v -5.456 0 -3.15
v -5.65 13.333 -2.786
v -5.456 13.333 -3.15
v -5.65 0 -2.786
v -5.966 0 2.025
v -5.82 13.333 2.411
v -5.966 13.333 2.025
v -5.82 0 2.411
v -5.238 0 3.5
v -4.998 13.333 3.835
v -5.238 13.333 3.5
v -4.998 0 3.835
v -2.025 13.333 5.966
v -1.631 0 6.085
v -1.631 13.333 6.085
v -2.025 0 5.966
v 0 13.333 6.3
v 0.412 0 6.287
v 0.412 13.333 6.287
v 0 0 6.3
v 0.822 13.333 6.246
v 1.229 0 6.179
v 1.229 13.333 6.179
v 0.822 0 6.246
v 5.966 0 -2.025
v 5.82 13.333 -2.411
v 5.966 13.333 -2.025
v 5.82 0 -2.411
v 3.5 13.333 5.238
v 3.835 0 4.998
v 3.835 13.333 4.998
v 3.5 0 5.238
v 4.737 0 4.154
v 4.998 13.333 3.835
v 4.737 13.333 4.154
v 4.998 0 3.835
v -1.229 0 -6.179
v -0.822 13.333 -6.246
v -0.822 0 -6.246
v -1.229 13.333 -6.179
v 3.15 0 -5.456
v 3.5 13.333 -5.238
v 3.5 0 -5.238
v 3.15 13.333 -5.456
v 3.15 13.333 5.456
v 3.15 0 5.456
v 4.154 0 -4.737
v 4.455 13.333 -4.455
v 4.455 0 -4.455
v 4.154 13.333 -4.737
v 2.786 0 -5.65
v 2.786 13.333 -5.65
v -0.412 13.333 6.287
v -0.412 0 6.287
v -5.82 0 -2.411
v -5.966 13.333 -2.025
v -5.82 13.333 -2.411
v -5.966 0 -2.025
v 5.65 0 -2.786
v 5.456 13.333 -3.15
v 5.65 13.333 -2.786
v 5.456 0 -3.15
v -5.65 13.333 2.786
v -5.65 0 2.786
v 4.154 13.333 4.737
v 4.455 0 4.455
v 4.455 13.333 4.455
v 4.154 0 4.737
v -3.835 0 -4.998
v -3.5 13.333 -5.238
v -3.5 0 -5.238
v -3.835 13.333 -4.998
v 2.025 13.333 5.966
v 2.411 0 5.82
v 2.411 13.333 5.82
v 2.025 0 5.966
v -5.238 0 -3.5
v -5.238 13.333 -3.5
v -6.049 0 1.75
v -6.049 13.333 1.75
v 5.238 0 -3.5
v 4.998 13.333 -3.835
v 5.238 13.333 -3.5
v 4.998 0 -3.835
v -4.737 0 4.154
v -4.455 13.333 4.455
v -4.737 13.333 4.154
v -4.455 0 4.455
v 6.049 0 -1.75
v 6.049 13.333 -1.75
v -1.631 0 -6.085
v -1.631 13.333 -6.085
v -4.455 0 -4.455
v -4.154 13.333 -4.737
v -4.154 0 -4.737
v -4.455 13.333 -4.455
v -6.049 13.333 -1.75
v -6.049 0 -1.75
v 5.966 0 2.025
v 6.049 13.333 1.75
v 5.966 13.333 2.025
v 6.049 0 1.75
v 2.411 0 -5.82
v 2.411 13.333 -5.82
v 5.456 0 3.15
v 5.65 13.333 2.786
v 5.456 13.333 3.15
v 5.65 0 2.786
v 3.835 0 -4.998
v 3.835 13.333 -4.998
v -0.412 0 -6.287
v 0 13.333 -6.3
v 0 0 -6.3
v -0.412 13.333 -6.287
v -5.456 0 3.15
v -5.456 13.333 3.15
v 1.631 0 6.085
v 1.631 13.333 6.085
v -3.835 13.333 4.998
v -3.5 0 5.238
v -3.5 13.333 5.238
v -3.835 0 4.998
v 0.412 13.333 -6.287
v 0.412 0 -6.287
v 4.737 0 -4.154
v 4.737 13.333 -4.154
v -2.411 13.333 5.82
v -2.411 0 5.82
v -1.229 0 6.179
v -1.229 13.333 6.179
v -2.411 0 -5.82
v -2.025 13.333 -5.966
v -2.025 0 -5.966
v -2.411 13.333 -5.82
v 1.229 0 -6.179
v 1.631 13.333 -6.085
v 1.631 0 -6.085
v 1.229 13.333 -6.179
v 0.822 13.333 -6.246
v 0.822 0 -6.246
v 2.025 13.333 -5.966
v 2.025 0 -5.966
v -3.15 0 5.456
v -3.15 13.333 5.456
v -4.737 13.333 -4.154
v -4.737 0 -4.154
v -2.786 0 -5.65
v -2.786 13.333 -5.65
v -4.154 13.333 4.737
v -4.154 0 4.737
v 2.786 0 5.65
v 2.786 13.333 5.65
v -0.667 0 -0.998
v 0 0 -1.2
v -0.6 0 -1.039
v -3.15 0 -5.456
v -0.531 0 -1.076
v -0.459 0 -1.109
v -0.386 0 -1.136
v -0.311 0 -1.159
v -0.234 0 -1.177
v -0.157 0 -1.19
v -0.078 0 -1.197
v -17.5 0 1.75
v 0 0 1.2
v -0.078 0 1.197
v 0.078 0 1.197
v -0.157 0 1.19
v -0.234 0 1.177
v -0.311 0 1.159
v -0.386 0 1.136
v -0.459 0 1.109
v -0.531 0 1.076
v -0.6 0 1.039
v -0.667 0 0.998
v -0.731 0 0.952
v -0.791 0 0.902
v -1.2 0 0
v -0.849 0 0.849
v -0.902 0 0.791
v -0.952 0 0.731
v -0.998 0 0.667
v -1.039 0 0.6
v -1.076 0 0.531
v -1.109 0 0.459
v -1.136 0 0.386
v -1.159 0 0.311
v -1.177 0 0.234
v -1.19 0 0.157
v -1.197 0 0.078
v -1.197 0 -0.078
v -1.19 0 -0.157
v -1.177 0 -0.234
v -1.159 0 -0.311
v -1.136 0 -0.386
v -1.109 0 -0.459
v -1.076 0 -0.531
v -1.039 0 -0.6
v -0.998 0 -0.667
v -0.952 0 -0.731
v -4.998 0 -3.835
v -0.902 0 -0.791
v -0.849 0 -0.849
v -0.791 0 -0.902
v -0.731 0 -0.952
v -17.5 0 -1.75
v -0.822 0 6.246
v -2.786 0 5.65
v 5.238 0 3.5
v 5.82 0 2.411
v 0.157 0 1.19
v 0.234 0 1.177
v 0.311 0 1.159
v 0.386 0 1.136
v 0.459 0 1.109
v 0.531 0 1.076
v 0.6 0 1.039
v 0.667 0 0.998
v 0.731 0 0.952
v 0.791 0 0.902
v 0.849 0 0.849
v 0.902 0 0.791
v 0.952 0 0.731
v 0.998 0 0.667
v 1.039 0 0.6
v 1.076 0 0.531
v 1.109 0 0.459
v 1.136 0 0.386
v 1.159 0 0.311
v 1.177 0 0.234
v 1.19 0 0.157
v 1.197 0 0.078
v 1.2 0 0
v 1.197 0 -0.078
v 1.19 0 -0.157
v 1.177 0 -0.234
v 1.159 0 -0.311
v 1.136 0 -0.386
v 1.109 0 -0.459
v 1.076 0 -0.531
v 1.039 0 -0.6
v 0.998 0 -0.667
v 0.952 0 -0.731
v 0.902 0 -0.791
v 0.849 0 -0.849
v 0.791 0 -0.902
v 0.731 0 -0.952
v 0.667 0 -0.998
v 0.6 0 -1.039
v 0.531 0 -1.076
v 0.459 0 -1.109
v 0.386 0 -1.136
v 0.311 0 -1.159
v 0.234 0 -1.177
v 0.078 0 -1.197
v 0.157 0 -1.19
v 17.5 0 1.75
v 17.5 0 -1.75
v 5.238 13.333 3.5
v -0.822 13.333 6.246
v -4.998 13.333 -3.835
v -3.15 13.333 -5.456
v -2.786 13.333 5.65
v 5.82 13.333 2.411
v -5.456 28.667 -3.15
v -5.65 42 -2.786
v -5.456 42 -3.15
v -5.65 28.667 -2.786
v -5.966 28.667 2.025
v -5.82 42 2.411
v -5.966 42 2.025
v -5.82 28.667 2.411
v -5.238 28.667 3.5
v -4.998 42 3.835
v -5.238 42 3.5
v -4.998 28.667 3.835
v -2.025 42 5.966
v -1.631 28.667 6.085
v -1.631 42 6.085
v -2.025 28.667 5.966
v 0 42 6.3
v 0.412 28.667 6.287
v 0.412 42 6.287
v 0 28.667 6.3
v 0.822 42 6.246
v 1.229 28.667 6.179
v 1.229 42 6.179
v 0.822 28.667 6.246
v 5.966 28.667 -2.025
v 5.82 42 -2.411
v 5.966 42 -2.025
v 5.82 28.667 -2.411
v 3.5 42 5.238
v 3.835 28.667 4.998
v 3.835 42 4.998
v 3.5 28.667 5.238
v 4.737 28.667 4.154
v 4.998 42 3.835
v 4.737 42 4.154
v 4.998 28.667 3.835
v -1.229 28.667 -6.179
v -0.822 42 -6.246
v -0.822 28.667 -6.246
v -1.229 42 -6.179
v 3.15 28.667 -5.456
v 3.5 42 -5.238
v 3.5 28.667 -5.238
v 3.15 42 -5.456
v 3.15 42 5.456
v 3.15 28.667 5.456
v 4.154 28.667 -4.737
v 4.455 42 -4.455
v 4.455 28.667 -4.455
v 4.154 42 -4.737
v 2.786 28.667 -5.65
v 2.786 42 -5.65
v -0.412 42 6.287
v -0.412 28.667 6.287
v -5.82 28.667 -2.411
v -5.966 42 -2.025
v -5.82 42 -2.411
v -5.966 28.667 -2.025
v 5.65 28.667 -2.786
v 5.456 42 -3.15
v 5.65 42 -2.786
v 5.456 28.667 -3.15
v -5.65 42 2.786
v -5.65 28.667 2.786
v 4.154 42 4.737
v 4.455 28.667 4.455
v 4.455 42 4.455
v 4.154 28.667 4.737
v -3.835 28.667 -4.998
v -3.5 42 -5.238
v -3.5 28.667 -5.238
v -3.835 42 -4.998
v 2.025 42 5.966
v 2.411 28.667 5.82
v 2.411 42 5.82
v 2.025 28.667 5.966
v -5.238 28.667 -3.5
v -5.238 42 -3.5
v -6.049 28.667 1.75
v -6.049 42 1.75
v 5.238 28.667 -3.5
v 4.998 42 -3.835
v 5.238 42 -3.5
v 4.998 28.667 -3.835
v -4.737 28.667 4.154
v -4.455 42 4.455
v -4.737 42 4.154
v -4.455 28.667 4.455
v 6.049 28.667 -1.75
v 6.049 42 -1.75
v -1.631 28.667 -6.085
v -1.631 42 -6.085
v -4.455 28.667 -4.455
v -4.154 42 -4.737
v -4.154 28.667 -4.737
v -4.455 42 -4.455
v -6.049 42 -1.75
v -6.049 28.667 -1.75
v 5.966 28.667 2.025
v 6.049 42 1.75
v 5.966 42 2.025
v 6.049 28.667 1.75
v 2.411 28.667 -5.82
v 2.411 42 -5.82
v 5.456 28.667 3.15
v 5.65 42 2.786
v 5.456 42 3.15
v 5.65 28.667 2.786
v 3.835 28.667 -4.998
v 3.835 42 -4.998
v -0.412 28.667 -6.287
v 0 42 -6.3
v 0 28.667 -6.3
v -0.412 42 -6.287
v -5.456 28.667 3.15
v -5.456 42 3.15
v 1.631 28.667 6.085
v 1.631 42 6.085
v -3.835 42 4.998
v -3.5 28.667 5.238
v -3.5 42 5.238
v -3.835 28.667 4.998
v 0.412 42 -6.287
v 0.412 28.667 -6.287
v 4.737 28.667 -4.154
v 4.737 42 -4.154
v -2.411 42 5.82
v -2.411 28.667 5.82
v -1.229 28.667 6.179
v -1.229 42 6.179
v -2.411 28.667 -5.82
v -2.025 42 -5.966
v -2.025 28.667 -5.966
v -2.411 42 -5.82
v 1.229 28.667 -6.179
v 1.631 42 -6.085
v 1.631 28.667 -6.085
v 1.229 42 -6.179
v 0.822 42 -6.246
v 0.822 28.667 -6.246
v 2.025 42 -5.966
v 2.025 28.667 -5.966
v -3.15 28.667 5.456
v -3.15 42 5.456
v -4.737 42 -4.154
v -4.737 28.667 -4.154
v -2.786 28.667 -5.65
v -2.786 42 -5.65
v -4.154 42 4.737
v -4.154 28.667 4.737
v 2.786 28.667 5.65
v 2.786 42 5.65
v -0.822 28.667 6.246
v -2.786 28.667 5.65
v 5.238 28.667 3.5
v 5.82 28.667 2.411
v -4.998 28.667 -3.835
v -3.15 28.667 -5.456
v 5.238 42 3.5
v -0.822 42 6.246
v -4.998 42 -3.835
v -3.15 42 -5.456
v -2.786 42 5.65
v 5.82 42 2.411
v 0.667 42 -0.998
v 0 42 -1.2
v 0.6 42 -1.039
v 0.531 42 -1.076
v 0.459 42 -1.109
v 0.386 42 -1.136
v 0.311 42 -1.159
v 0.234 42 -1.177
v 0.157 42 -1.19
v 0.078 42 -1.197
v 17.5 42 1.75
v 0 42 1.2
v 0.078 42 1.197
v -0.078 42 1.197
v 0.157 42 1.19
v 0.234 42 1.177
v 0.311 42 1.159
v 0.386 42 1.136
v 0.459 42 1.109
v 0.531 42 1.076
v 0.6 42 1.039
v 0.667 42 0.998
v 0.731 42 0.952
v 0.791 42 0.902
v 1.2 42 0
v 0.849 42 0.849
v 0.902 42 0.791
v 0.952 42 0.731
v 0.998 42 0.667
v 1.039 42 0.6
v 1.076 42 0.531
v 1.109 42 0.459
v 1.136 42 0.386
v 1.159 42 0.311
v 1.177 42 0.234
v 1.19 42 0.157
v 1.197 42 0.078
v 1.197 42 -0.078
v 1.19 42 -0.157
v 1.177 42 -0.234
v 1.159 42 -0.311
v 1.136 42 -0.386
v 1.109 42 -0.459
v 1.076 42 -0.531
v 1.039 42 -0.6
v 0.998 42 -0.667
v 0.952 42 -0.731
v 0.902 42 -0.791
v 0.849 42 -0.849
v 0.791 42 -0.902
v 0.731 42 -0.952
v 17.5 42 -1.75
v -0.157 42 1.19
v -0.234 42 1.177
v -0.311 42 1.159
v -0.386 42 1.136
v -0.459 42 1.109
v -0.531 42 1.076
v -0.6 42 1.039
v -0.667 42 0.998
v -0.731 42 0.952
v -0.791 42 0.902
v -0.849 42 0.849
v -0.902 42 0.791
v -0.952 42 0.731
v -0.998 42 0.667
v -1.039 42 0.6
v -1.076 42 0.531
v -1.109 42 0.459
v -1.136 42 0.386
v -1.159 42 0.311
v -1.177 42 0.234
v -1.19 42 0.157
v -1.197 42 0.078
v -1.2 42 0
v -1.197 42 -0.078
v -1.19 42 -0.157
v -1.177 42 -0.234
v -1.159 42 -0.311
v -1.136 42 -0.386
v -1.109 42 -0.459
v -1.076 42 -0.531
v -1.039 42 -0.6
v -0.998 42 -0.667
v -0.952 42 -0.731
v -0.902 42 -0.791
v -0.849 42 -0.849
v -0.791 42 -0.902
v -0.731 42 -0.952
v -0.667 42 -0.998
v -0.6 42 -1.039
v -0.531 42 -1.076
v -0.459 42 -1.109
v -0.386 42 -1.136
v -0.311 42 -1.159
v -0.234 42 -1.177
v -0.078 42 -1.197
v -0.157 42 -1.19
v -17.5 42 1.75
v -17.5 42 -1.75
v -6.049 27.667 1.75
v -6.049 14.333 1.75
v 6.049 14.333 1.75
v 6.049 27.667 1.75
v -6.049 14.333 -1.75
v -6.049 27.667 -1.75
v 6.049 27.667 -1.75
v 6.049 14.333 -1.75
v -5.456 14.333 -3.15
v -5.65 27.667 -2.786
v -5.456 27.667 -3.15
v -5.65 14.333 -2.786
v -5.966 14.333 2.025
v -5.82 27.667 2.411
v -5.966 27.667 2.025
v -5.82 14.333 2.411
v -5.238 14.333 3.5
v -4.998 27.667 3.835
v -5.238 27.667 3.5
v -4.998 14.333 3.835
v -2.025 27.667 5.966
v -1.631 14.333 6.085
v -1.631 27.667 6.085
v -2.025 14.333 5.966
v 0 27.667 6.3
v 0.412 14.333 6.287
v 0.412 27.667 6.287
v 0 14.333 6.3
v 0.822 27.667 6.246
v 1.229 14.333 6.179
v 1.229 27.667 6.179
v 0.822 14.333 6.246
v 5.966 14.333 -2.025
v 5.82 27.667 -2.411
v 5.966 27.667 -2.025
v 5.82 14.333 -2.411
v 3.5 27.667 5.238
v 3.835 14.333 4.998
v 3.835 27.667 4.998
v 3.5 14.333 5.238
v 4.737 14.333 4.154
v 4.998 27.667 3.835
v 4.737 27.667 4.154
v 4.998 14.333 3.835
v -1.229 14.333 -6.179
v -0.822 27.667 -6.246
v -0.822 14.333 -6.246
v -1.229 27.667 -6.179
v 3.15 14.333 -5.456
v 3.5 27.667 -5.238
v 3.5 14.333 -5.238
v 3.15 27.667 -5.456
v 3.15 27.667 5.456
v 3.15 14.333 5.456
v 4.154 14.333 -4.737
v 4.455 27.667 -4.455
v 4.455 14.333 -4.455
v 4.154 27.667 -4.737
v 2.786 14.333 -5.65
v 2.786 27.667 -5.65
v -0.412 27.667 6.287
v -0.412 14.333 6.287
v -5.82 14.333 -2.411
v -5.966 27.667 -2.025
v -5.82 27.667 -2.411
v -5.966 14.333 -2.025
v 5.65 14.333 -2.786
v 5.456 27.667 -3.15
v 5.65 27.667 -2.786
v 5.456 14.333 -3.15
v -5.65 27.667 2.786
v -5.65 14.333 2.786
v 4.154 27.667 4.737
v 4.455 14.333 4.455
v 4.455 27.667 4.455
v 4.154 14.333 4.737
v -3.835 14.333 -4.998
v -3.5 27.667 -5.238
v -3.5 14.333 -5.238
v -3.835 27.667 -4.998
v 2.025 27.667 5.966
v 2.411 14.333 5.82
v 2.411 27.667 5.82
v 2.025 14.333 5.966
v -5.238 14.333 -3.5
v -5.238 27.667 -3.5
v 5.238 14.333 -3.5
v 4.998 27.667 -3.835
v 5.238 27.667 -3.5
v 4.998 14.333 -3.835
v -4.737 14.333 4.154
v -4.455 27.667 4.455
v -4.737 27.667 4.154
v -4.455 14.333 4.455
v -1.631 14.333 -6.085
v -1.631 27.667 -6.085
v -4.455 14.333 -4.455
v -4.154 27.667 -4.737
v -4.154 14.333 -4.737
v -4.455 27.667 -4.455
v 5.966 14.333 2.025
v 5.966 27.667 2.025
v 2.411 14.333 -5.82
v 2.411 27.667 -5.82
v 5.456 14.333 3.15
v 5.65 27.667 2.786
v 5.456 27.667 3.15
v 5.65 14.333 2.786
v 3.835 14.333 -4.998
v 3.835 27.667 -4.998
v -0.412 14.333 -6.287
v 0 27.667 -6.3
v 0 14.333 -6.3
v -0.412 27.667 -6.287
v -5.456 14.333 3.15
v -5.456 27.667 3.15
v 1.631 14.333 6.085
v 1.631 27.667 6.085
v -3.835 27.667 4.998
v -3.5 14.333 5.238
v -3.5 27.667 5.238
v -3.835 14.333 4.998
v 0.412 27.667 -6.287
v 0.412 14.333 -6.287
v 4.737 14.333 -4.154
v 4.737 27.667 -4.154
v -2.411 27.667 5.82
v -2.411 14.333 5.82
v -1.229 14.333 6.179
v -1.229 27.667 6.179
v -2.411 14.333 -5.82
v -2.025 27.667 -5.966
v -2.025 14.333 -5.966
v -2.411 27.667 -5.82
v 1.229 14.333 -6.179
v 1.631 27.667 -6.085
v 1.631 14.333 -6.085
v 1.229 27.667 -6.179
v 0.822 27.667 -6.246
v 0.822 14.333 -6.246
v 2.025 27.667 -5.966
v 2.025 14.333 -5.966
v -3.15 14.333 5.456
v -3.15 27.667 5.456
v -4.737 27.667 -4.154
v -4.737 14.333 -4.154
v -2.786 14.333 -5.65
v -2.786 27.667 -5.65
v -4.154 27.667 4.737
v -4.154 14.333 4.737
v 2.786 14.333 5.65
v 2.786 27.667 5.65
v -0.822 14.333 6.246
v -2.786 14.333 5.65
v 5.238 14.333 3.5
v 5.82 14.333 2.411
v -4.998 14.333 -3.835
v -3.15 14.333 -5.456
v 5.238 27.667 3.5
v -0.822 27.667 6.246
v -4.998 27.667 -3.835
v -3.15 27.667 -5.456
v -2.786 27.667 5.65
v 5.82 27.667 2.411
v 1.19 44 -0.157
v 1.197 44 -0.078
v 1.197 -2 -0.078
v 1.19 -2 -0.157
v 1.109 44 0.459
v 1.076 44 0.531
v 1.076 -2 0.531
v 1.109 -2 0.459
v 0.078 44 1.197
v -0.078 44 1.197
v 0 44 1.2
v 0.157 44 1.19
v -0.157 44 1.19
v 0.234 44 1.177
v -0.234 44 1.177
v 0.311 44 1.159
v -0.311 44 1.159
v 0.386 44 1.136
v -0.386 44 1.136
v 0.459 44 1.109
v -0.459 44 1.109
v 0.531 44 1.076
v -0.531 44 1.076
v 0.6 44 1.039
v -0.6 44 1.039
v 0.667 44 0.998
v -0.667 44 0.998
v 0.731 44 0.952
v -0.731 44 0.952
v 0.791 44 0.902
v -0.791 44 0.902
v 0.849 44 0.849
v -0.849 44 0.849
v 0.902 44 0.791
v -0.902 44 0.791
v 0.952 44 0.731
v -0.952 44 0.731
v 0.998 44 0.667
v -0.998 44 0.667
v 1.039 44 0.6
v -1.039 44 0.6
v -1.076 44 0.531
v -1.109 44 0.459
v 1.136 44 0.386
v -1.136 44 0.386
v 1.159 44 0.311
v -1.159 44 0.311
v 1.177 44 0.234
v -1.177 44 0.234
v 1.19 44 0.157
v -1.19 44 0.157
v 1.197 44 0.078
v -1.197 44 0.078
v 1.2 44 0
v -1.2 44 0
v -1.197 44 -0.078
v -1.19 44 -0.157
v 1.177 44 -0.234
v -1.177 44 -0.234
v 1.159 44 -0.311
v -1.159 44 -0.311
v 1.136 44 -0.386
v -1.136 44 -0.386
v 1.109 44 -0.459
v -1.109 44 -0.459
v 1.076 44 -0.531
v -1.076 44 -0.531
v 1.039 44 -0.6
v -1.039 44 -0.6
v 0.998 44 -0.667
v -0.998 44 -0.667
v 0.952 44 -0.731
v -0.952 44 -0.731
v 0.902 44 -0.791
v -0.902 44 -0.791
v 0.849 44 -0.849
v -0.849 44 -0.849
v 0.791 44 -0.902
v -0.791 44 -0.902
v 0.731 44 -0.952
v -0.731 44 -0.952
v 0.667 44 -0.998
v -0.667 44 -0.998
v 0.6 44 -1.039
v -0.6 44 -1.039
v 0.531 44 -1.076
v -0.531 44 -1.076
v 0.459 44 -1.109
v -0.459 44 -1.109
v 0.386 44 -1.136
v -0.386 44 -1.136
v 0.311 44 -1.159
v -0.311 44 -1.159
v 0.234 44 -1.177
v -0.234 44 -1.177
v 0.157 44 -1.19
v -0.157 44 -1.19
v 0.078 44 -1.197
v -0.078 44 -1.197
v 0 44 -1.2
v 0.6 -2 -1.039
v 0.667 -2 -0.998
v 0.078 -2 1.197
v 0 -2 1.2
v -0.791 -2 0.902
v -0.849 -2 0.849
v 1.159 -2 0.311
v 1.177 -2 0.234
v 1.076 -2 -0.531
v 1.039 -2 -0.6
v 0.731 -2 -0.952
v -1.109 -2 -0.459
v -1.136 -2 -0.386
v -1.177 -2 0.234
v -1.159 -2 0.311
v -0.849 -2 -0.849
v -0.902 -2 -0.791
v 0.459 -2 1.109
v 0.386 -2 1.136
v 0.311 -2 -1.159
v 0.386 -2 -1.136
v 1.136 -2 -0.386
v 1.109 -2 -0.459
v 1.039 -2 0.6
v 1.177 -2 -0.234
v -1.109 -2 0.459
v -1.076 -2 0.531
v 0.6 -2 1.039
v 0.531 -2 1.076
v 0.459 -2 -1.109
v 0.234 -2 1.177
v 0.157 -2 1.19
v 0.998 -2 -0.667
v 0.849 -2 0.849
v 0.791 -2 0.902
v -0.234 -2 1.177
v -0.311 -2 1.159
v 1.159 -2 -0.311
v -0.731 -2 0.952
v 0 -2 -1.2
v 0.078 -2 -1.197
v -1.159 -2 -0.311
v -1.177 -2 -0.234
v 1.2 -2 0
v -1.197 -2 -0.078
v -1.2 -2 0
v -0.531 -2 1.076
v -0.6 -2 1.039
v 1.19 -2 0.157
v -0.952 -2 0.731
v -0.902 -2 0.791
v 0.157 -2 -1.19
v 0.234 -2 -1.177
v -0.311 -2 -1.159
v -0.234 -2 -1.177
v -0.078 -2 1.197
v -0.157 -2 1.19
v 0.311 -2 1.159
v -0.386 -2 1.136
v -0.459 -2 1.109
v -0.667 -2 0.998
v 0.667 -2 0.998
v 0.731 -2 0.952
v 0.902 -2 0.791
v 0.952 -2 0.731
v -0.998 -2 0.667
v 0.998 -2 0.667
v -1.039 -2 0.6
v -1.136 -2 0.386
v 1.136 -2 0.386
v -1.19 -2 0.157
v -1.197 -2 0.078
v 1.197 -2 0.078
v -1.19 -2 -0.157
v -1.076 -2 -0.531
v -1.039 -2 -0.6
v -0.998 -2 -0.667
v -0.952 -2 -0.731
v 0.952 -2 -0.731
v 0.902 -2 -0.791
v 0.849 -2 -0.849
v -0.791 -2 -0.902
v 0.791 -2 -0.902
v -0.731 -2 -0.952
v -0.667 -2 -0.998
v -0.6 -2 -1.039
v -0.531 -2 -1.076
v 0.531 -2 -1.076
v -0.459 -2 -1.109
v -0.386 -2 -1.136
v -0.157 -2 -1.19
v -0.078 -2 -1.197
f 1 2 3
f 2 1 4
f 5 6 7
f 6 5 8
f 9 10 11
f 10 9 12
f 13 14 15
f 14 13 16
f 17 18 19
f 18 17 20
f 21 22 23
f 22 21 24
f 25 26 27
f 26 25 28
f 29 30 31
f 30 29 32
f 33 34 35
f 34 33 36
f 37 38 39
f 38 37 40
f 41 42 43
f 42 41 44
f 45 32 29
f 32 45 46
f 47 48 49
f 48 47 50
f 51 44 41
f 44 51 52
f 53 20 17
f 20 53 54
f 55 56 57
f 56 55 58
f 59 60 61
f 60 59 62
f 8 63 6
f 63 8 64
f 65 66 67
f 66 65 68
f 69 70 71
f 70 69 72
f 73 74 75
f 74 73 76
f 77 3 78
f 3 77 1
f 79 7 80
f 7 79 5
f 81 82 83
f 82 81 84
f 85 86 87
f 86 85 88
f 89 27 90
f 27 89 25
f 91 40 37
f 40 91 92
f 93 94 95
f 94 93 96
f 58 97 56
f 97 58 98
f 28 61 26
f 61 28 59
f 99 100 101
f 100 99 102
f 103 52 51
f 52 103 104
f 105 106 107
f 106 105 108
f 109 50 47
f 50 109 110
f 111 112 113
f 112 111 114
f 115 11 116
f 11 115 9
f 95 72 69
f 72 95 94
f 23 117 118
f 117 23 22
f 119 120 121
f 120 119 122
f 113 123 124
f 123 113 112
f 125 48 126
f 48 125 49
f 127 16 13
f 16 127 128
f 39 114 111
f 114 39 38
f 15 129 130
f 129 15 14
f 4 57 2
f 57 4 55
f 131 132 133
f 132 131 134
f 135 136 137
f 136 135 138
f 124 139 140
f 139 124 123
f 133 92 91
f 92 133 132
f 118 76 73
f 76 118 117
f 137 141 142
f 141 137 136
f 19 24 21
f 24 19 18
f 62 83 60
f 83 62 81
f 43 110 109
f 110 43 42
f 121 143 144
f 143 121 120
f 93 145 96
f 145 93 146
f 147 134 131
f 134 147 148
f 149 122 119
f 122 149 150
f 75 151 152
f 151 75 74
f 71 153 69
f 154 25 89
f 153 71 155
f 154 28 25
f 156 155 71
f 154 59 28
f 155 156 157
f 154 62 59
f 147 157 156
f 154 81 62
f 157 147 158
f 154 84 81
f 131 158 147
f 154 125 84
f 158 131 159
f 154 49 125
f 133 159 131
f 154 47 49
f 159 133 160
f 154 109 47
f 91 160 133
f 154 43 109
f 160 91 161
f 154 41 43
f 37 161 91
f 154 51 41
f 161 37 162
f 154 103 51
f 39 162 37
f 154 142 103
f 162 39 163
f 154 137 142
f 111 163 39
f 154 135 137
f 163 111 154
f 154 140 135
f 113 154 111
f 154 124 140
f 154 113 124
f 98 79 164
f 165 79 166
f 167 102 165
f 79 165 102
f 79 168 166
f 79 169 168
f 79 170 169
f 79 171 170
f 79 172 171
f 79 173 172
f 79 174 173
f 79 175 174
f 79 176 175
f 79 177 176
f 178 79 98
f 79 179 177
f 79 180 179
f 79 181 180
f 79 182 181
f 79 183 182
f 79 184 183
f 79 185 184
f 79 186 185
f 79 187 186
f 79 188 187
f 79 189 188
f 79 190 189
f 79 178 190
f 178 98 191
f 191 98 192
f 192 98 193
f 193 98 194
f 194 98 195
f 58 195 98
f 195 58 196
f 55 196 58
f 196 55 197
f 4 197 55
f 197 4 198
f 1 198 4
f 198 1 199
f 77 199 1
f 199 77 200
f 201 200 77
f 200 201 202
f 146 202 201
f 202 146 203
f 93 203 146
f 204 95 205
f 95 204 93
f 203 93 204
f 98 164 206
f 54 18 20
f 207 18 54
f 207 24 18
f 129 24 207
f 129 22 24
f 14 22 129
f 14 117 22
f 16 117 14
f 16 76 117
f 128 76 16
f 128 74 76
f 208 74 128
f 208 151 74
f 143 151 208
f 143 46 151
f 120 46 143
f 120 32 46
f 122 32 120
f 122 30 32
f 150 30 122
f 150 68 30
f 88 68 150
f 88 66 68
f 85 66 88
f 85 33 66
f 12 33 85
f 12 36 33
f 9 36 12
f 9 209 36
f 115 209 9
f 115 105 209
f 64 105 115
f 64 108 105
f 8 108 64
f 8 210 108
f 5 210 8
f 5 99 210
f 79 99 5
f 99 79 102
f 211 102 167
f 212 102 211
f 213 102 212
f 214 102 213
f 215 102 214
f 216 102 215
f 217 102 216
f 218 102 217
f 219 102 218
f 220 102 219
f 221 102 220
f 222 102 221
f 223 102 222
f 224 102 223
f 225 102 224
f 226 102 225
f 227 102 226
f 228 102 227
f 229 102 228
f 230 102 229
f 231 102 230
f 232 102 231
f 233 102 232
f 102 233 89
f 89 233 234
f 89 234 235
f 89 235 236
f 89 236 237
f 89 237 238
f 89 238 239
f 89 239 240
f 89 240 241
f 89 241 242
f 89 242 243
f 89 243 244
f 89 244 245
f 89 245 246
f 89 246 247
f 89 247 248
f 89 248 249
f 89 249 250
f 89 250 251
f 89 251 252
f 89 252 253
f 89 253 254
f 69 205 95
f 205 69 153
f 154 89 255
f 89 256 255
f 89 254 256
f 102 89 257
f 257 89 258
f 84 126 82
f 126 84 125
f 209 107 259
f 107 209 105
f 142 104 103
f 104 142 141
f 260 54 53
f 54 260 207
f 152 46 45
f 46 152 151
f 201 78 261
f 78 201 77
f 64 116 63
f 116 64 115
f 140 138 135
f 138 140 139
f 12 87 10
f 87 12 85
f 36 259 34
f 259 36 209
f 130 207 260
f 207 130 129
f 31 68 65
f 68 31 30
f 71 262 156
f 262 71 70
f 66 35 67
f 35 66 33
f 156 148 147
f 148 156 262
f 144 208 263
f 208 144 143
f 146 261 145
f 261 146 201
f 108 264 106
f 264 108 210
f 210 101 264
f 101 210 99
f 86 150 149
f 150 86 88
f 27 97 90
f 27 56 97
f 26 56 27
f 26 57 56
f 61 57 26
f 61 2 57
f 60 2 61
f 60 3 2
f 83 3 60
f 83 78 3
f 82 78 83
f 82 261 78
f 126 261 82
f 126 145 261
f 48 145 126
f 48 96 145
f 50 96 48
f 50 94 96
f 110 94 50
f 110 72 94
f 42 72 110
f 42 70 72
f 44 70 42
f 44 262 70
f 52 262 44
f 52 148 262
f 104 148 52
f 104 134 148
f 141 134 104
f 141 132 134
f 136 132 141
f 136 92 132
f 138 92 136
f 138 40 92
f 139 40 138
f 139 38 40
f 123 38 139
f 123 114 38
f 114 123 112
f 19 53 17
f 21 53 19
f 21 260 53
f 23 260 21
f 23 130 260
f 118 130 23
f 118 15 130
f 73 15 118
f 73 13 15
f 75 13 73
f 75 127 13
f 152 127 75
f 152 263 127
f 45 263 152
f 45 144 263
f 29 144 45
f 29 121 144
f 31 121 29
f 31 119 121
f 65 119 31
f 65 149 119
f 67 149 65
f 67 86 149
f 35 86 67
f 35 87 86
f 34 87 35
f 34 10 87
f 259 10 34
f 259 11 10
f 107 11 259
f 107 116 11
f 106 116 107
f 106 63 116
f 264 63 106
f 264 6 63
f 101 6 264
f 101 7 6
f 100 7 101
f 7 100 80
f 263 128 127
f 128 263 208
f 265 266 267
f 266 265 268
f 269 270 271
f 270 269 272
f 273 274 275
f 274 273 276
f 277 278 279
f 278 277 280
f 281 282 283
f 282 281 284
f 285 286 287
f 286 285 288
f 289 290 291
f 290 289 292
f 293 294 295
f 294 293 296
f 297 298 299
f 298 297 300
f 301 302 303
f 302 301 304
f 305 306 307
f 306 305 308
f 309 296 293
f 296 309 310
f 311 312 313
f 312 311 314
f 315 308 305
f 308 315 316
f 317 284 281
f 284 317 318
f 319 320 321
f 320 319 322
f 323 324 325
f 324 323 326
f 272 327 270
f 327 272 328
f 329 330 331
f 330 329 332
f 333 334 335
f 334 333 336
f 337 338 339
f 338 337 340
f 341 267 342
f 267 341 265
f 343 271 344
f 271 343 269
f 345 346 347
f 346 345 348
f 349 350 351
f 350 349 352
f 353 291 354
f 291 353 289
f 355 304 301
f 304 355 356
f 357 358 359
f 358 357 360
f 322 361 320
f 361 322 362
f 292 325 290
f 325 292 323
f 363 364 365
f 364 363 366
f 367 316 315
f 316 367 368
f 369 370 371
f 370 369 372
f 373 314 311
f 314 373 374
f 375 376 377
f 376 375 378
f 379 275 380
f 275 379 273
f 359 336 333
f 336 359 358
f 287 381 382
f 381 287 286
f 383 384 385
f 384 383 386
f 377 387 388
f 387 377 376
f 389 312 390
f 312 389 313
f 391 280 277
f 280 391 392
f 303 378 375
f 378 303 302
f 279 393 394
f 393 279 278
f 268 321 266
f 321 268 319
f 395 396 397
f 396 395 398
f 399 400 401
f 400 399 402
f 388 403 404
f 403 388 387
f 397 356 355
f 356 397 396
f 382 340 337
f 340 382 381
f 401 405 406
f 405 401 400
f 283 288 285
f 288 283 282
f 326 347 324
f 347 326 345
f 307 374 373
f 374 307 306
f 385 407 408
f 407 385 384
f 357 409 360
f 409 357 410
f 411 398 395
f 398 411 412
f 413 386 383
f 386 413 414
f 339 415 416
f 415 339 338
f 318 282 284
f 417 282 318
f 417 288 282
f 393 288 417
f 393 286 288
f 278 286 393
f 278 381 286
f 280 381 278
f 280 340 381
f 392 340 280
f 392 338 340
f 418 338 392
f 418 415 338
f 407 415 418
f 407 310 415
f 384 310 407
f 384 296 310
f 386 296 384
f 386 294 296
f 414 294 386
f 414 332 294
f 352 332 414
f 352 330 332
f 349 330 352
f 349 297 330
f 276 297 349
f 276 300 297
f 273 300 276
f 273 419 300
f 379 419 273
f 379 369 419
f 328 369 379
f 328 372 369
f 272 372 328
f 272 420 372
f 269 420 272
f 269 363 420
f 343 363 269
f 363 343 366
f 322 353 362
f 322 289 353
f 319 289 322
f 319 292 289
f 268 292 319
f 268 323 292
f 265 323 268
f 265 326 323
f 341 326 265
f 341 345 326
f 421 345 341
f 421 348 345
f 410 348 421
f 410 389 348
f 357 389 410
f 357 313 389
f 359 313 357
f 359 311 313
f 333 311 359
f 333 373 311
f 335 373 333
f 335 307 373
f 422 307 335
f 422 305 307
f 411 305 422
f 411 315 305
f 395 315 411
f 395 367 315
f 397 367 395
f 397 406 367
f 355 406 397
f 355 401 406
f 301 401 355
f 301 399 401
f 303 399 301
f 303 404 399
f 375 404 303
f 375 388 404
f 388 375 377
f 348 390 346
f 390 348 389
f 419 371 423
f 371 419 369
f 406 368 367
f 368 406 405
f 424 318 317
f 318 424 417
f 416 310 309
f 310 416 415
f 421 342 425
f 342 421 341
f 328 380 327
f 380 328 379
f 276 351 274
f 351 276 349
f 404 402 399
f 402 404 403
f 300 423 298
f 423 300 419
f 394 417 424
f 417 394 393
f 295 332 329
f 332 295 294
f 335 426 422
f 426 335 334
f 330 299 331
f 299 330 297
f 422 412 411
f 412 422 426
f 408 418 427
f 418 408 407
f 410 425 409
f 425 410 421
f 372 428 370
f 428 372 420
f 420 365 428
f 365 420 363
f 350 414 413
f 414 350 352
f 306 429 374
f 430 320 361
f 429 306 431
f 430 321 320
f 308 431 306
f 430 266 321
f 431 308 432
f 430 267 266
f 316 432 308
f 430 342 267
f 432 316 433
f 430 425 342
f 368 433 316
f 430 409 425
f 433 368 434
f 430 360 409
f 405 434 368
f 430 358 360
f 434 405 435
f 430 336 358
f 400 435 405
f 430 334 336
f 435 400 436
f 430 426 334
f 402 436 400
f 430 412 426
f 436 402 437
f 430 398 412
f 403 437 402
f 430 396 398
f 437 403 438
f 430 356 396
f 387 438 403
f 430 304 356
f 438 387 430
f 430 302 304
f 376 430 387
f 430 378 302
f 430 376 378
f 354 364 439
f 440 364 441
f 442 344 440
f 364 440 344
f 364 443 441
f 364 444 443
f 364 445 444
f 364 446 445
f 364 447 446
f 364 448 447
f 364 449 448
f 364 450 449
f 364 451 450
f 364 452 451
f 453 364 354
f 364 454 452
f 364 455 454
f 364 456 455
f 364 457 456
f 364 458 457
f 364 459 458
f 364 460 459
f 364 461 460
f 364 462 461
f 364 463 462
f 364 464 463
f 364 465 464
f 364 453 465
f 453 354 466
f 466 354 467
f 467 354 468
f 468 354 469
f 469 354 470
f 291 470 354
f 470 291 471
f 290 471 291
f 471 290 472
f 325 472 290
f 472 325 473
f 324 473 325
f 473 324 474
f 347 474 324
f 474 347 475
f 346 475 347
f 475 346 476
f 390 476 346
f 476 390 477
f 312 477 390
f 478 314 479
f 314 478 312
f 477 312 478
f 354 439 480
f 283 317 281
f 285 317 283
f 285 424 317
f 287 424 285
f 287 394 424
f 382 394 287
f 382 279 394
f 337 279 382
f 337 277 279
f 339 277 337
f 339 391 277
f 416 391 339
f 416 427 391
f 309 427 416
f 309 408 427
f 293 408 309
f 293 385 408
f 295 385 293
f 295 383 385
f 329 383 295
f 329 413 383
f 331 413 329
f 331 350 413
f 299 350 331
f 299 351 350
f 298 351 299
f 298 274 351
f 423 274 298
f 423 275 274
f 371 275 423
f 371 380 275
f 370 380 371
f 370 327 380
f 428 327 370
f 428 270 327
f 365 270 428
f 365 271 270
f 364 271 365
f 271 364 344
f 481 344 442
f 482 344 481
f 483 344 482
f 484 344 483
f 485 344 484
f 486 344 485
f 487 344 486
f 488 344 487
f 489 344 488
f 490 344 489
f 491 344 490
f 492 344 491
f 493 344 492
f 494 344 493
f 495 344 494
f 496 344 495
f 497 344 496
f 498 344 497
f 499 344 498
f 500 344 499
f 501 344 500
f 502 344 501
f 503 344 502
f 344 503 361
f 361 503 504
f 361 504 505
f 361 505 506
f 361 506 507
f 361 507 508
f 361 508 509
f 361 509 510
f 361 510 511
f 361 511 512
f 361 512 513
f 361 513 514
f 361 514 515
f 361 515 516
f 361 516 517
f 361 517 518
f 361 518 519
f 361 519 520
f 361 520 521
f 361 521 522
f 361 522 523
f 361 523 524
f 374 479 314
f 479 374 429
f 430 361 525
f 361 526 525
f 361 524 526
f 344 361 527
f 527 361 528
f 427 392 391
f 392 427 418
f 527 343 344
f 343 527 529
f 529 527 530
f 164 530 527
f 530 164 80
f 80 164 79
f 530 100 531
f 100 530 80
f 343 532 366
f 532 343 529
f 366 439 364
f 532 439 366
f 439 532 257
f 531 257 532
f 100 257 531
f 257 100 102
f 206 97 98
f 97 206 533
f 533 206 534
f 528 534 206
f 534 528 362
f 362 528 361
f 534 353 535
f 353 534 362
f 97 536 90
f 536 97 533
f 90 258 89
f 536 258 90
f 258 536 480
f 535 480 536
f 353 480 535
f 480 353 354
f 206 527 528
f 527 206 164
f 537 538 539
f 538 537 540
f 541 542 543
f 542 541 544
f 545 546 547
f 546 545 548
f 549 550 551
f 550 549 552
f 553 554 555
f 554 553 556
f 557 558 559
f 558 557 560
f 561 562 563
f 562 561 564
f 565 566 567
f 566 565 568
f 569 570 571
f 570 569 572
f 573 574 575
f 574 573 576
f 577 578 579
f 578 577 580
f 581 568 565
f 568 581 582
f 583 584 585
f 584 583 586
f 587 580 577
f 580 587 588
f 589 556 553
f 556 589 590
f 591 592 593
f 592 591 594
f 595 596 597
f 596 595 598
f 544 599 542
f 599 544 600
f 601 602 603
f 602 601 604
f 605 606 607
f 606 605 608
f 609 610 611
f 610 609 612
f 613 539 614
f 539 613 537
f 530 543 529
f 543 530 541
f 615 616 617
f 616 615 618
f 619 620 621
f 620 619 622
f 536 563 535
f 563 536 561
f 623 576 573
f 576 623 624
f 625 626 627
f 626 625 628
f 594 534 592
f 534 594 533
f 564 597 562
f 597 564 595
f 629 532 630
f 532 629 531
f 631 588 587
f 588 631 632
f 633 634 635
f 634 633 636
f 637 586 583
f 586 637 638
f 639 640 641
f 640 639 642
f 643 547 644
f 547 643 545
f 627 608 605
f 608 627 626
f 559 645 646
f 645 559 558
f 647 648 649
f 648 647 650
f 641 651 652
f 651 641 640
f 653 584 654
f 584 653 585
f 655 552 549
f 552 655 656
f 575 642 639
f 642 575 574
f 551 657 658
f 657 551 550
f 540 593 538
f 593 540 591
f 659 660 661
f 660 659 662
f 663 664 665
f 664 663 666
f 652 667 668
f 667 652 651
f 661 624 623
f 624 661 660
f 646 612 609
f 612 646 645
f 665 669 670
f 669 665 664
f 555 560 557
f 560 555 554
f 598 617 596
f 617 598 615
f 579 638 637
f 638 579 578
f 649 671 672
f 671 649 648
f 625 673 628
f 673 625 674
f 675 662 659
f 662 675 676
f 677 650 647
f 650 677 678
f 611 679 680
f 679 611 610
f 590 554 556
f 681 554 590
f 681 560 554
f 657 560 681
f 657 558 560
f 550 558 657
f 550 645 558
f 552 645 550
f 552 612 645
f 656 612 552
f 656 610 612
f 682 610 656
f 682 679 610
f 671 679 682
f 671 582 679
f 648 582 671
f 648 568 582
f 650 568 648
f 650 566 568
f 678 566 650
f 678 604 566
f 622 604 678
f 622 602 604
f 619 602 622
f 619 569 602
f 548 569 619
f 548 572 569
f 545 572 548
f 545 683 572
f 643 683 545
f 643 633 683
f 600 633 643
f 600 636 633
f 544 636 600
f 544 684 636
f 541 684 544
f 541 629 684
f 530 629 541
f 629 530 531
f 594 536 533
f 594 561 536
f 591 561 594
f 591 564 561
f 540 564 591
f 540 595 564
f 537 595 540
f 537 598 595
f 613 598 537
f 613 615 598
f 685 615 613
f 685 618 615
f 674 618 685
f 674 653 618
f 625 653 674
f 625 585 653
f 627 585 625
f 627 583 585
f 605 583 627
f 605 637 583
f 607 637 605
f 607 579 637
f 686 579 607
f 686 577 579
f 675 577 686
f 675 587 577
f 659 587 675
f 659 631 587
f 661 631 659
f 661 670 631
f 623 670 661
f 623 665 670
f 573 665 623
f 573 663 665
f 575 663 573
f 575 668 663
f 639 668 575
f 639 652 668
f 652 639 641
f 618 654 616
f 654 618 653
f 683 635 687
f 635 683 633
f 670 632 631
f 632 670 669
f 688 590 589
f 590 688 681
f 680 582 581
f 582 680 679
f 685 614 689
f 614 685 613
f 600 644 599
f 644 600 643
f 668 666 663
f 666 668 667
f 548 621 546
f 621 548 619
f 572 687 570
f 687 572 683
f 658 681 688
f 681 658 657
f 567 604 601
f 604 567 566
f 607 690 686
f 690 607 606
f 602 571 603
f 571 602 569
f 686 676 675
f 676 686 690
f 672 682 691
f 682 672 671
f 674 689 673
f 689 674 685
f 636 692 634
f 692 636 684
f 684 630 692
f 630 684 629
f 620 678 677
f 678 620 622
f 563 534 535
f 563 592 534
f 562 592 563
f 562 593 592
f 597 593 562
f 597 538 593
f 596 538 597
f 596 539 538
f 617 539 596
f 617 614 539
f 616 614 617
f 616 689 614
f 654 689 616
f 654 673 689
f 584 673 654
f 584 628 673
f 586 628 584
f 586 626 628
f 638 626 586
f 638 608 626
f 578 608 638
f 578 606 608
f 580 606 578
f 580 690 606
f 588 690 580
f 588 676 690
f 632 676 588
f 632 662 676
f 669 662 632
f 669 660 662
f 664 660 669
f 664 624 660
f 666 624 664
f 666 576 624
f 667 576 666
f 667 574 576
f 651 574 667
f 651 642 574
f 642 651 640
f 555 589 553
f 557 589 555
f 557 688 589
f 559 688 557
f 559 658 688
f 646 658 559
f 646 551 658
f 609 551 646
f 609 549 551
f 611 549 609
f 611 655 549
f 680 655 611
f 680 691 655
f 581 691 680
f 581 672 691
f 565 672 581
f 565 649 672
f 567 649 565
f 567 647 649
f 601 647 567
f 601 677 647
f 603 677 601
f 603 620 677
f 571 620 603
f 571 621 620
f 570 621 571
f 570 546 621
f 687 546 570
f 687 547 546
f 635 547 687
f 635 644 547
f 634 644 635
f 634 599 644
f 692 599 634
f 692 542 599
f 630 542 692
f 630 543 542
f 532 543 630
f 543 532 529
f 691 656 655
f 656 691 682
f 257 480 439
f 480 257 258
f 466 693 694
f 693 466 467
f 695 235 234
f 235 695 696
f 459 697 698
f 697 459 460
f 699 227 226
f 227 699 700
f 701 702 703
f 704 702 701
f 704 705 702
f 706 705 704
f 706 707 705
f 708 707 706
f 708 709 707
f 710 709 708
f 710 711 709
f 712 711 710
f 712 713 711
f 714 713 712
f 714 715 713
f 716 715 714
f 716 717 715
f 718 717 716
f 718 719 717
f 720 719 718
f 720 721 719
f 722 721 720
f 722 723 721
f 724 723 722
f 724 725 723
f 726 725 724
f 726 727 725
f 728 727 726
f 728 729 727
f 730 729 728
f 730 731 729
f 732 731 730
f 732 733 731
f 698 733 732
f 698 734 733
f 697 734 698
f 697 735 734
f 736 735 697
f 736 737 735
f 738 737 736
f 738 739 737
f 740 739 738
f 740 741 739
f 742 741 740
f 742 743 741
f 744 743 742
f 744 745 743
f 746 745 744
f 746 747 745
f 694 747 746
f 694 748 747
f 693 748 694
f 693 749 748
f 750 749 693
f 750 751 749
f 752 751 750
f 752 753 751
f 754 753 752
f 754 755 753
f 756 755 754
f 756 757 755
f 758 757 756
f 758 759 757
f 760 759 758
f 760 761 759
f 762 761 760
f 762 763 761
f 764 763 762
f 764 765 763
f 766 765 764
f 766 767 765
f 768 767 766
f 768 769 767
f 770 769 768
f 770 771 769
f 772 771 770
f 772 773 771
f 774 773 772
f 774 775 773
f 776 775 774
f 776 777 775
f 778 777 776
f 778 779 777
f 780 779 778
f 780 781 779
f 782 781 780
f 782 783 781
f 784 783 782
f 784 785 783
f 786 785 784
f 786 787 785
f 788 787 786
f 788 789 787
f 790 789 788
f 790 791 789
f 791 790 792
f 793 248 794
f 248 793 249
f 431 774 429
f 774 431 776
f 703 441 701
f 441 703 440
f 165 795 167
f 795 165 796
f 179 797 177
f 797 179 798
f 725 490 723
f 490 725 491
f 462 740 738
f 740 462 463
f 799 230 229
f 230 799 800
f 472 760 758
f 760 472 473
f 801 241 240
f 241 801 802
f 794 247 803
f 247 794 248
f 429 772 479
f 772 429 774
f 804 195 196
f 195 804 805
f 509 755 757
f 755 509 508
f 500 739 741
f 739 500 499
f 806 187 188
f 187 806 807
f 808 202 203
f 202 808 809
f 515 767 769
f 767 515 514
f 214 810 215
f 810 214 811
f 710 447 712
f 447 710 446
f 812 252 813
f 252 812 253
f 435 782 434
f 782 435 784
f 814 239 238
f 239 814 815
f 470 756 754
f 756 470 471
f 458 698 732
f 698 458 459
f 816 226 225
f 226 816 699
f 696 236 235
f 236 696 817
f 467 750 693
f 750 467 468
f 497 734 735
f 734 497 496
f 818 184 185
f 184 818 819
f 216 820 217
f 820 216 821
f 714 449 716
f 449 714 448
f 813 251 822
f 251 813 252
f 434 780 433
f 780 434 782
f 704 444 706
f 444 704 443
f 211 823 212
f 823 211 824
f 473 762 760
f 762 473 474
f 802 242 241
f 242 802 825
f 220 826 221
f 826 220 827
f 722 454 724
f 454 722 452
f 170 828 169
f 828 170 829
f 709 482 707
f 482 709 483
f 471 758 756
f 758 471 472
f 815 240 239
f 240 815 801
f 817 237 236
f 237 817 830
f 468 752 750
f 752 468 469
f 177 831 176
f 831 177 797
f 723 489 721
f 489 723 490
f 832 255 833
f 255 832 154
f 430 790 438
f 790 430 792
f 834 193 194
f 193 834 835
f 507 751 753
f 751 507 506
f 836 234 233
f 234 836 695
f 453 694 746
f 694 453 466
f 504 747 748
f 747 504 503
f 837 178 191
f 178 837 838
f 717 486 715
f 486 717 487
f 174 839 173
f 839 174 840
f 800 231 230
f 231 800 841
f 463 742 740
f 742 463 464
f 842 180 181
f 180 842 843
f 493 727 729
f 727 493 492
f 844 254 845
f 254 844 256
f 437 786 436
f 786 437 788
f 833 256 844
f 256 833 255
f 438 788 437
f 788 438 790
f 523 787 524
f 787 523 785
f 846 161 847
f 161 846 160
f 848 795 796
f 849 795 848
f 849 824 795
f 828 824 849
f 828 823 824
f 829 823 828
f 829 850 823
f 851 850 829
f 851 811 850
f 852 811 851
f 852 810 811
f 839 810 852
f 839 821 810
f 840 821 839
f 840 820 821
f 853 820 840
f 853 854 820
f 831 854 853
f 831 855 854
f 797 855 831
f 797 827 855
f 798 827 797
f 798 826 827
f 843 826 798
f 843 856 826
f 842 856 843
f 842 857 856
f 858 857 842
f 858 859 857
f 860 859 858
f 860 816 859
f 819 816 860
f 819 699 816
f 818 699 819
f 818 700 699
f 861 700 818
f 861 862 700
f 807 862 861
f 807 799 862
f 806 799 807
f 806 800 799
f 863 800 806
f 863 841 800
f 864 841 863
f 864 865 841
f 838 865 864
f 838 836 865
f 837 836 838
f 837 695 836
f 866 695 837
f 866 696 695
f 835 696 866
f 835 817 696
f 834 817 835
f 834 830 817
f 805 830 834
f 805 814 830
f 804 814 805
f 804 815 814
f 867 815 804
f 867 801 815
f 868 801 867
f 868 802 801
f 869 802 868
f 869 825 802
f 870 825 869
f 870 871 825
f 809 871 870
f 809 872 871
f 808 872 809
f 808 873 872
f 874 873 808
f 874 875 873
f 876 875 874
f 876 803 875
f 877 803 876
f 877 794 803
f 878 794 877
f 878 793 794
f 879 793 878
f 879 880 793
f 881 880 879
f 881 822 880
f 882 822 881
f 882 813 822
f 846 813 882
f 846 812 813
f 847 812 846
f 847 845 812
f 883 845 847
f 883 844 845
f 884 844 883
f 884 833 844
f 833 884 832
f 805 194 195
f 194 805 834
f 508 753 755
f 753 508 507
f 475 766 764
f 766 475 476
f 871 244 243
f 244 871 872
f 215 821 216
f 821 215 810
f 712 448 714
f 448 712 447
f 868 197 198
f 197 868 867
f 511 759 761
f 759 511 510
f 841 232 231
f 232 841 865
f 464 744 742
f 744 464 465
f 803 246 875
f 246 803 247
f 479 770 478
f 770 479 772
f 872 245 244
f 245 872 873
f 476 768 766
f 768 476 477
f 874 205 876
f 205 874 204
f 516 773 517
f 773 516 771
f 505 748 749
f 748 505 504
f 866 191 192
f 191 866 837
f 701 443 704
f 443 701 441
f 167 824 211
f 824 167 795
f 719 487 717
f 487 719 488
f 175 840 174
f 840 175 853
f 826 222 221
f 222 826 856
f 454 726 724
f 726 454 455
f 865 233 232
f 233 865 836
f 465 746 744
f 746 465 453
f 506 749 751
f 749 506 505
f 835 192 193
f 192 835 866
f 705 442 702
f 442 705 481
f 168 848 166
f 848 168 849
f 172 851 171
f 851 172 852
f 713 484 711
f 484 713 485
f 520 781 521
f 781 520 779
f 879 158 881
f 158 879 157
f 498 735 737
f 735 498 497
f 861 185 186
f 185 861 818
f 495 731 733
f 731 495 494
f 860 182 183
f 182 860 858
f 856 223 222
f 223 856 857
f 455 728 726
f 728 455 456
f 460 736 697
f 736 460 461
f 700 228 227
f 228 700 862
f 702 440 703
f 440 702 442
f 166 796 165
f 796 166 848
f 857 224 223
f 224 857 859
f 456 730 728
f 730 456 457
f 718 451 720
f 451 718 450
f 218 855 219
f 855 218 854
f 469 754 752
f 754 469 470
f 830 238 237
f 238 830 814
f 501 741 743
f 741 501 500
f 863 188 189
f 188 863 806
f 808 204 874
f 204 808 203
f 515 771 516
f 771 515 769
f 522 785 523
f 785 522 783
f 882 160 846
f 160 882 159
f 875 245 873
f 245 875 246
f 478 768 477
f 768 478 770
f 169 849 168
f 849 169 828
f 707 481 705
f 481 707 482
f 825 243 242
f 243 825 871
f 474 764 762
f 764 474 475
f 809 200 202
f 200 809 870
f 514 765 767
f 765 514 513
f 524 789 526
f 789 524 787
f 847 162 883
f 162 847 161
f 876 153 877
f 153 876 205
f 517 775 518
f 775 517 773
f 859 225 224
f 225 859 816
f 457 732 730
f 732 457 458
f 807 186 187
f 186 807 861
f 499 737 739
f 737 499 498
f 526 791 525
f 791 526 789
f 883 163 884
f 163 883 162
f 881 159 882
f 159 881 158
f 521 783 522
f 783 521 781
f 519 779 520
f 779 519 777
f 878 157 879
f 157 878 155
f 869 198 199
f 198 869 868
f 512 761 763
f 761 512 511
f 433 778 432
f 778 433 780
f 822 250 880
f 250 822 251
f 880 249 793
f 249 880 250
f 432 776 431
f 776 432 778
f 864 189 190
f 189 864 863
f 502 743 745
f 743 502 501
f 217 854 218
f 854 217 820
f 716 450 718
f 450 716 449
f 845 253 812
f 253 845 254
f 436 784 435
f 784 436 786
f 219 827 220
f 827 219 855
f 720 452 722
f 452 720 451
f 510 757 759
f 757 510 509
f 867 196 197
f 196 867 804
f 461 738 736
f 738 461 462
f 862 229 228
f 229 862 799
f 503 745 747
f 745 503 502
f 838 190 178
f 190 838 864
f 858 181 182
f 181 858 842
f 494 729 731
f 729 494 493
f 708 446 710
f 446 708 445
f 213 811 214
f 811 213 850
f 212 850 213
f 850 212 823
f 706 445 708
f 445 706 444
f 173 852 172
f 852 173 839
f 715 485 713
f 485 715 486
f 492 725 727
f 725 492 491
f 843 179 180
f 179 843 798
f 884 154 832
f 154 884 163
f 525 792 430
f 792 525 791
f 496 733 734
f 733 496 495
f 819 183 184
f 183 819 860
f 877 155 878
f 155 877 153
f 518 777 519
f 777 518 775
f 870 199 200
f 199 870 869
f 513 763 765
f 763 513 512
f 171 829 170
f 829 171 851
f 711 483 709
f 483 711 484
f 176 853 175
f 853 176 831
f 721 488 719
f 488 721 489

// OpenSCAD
// Parametric small hinge, version 2.
//
// Units are millimeters.  Change `show_part` to render the whole hinge or one
// part at a time for export/printing.

$fn = 96;

/* [View] */

// Select which v2 part or layout to render.
show_part = "assembly"; // [assembly: Assembly, exploded: Exploded, left_hinge: Left hinge, right_hinge: Right hinge, left_leaf: Left leaf, right_leaf: Right leaf, left_barrels: Left barrels, right_barrel: Right barrel, pin: Pin]

exploded_spacing = 18;

// Left hinge leaf parameters.
left_hinge_width = 17.5;
left_hinge_length = 42;
left_hinge_thickness = 3.5;

// Right hinge leaf parameters.
right_hinge_width = 17.5;
right_hinge_length = 42;
right_hinge_thickness = 3.5;

// Barrel parameters shared by both hinge leaves.
barrel_width = 12.6;        // Outside barrel diameter across X.
barrel_length = 42;         // Total hinge barrel span along Y.
barrel_thickness = 12.6;    // Outside barrel diameter across Z.
barrel_clearance = 0.35;    // Extra radial clearance around the pin hole.
barrel_gap = 1.0;           // Axial gap between neighboring barrel knuckles.

// Hinge pin parameters.
pin_width = 2.4;            // Pin diameter across X.
pin_thickness = 2.4;        // Pin diameter across Z.
pin_length = barrel_length + 4;
pin_overhang = (pin_length - barrel_length) / 2;
pin_clearance = 0.15;       // Extra clearance to subtract from barrel holes.

// Small overlap to avoid coincident faces in boolean operations.
epsilon = 0.01;

module elliptical_cylinder_y(length, width, thickness) {
    rotate([-90, 0, 0])
        scale([width, thickness, 1])
            cylinder(h = length, d = 1, center = false);
}

module hinge_pin(length = pin_length, width = pin_width, thickness = pin_thickness) {
    translate([0, -pin_overhang, 0])
        elliptical_cylinder_y(length, width, thickness);
}

module barrel_knuckle(y_start, length) {
    difference() {
        translate([0, y_start, 0])
            elliptical_cylinder_y(length, barrel_width, barrel_thickness);

        translate([0, y_start - epsilon, 0])
            elliptical_cylinder_y(
                length + 2 * epsilon,
                pin_width + 2 * (pin_clearance + barrel_clearance),
                pin_thickness + 2 * (pin_clearance + barrel_clearance)
            );
    }
}

module left_leaf() {
    translate([-left_hinge_width, 0, -left_hinge_thickness / 2])
        cube([left_hinge_width, left_hinge_length, left_hinge_thickness], center = false);
}

module right_leaf() {
    translate([0, 0, -right_hinge_thickness / 2])
        cube([right_hinge_width, right_hinge_length, right_hinge_thickness], center = false);
}

module left_barrels() {
    knuckle_length = (barrel_length - 2 * barrel_gap) / 3;

    barrel_knuckle(0, knuckle_length);
    barrel_knuckle(2 * knuckle_length + 2 * barrel_gap, knuckle_length);
}

module right_barrel() {
    knuckle_length = (barrel_length - 2 * barrel_gap) / 3;

    barrel_knuckle(knuckle_length + barrel_gap, knuckle_length);
}

module left_hinge() {
    union() {
        left_leaf();
        left_barrels();
    }
}

module right_hinge() {
    union() {
        right_leaf();
        right_barrel();
    }
}

module hinge_assembly(show_pin = true) {
    left_hinge();
    right_hinge();

    if (show_pin) {
        hinge_pin();
    }
}

module hinge_exploded() {
    translate([-exploded_spacing, 0, 0])
        left_hinge();

    translate([exploded_spacing, 0, 0])
        right_hinge();

    translate([0, 0, exploded_spacing])
        hinge_pin();
}

if (show_part == "exploded") {
    hinge_exploded();
} else if (show_part == "left_hinge") {
    left_hinge();
} else if (show_part == "right_hinge") {
    right_hinge();
} else if (show_part == "left_leaf") {
    left_leaf();
} else if (show_part == "right_leaf") {
    right_leaf();
} else if (show_part == "left_barrels") {
    left_barrels();
} else if (show_part == "right_barrel") {
    right_barrel();
} else if (show_part == "pin") {
    hinge_pin();
} else {
    hinge_assembly();
}
